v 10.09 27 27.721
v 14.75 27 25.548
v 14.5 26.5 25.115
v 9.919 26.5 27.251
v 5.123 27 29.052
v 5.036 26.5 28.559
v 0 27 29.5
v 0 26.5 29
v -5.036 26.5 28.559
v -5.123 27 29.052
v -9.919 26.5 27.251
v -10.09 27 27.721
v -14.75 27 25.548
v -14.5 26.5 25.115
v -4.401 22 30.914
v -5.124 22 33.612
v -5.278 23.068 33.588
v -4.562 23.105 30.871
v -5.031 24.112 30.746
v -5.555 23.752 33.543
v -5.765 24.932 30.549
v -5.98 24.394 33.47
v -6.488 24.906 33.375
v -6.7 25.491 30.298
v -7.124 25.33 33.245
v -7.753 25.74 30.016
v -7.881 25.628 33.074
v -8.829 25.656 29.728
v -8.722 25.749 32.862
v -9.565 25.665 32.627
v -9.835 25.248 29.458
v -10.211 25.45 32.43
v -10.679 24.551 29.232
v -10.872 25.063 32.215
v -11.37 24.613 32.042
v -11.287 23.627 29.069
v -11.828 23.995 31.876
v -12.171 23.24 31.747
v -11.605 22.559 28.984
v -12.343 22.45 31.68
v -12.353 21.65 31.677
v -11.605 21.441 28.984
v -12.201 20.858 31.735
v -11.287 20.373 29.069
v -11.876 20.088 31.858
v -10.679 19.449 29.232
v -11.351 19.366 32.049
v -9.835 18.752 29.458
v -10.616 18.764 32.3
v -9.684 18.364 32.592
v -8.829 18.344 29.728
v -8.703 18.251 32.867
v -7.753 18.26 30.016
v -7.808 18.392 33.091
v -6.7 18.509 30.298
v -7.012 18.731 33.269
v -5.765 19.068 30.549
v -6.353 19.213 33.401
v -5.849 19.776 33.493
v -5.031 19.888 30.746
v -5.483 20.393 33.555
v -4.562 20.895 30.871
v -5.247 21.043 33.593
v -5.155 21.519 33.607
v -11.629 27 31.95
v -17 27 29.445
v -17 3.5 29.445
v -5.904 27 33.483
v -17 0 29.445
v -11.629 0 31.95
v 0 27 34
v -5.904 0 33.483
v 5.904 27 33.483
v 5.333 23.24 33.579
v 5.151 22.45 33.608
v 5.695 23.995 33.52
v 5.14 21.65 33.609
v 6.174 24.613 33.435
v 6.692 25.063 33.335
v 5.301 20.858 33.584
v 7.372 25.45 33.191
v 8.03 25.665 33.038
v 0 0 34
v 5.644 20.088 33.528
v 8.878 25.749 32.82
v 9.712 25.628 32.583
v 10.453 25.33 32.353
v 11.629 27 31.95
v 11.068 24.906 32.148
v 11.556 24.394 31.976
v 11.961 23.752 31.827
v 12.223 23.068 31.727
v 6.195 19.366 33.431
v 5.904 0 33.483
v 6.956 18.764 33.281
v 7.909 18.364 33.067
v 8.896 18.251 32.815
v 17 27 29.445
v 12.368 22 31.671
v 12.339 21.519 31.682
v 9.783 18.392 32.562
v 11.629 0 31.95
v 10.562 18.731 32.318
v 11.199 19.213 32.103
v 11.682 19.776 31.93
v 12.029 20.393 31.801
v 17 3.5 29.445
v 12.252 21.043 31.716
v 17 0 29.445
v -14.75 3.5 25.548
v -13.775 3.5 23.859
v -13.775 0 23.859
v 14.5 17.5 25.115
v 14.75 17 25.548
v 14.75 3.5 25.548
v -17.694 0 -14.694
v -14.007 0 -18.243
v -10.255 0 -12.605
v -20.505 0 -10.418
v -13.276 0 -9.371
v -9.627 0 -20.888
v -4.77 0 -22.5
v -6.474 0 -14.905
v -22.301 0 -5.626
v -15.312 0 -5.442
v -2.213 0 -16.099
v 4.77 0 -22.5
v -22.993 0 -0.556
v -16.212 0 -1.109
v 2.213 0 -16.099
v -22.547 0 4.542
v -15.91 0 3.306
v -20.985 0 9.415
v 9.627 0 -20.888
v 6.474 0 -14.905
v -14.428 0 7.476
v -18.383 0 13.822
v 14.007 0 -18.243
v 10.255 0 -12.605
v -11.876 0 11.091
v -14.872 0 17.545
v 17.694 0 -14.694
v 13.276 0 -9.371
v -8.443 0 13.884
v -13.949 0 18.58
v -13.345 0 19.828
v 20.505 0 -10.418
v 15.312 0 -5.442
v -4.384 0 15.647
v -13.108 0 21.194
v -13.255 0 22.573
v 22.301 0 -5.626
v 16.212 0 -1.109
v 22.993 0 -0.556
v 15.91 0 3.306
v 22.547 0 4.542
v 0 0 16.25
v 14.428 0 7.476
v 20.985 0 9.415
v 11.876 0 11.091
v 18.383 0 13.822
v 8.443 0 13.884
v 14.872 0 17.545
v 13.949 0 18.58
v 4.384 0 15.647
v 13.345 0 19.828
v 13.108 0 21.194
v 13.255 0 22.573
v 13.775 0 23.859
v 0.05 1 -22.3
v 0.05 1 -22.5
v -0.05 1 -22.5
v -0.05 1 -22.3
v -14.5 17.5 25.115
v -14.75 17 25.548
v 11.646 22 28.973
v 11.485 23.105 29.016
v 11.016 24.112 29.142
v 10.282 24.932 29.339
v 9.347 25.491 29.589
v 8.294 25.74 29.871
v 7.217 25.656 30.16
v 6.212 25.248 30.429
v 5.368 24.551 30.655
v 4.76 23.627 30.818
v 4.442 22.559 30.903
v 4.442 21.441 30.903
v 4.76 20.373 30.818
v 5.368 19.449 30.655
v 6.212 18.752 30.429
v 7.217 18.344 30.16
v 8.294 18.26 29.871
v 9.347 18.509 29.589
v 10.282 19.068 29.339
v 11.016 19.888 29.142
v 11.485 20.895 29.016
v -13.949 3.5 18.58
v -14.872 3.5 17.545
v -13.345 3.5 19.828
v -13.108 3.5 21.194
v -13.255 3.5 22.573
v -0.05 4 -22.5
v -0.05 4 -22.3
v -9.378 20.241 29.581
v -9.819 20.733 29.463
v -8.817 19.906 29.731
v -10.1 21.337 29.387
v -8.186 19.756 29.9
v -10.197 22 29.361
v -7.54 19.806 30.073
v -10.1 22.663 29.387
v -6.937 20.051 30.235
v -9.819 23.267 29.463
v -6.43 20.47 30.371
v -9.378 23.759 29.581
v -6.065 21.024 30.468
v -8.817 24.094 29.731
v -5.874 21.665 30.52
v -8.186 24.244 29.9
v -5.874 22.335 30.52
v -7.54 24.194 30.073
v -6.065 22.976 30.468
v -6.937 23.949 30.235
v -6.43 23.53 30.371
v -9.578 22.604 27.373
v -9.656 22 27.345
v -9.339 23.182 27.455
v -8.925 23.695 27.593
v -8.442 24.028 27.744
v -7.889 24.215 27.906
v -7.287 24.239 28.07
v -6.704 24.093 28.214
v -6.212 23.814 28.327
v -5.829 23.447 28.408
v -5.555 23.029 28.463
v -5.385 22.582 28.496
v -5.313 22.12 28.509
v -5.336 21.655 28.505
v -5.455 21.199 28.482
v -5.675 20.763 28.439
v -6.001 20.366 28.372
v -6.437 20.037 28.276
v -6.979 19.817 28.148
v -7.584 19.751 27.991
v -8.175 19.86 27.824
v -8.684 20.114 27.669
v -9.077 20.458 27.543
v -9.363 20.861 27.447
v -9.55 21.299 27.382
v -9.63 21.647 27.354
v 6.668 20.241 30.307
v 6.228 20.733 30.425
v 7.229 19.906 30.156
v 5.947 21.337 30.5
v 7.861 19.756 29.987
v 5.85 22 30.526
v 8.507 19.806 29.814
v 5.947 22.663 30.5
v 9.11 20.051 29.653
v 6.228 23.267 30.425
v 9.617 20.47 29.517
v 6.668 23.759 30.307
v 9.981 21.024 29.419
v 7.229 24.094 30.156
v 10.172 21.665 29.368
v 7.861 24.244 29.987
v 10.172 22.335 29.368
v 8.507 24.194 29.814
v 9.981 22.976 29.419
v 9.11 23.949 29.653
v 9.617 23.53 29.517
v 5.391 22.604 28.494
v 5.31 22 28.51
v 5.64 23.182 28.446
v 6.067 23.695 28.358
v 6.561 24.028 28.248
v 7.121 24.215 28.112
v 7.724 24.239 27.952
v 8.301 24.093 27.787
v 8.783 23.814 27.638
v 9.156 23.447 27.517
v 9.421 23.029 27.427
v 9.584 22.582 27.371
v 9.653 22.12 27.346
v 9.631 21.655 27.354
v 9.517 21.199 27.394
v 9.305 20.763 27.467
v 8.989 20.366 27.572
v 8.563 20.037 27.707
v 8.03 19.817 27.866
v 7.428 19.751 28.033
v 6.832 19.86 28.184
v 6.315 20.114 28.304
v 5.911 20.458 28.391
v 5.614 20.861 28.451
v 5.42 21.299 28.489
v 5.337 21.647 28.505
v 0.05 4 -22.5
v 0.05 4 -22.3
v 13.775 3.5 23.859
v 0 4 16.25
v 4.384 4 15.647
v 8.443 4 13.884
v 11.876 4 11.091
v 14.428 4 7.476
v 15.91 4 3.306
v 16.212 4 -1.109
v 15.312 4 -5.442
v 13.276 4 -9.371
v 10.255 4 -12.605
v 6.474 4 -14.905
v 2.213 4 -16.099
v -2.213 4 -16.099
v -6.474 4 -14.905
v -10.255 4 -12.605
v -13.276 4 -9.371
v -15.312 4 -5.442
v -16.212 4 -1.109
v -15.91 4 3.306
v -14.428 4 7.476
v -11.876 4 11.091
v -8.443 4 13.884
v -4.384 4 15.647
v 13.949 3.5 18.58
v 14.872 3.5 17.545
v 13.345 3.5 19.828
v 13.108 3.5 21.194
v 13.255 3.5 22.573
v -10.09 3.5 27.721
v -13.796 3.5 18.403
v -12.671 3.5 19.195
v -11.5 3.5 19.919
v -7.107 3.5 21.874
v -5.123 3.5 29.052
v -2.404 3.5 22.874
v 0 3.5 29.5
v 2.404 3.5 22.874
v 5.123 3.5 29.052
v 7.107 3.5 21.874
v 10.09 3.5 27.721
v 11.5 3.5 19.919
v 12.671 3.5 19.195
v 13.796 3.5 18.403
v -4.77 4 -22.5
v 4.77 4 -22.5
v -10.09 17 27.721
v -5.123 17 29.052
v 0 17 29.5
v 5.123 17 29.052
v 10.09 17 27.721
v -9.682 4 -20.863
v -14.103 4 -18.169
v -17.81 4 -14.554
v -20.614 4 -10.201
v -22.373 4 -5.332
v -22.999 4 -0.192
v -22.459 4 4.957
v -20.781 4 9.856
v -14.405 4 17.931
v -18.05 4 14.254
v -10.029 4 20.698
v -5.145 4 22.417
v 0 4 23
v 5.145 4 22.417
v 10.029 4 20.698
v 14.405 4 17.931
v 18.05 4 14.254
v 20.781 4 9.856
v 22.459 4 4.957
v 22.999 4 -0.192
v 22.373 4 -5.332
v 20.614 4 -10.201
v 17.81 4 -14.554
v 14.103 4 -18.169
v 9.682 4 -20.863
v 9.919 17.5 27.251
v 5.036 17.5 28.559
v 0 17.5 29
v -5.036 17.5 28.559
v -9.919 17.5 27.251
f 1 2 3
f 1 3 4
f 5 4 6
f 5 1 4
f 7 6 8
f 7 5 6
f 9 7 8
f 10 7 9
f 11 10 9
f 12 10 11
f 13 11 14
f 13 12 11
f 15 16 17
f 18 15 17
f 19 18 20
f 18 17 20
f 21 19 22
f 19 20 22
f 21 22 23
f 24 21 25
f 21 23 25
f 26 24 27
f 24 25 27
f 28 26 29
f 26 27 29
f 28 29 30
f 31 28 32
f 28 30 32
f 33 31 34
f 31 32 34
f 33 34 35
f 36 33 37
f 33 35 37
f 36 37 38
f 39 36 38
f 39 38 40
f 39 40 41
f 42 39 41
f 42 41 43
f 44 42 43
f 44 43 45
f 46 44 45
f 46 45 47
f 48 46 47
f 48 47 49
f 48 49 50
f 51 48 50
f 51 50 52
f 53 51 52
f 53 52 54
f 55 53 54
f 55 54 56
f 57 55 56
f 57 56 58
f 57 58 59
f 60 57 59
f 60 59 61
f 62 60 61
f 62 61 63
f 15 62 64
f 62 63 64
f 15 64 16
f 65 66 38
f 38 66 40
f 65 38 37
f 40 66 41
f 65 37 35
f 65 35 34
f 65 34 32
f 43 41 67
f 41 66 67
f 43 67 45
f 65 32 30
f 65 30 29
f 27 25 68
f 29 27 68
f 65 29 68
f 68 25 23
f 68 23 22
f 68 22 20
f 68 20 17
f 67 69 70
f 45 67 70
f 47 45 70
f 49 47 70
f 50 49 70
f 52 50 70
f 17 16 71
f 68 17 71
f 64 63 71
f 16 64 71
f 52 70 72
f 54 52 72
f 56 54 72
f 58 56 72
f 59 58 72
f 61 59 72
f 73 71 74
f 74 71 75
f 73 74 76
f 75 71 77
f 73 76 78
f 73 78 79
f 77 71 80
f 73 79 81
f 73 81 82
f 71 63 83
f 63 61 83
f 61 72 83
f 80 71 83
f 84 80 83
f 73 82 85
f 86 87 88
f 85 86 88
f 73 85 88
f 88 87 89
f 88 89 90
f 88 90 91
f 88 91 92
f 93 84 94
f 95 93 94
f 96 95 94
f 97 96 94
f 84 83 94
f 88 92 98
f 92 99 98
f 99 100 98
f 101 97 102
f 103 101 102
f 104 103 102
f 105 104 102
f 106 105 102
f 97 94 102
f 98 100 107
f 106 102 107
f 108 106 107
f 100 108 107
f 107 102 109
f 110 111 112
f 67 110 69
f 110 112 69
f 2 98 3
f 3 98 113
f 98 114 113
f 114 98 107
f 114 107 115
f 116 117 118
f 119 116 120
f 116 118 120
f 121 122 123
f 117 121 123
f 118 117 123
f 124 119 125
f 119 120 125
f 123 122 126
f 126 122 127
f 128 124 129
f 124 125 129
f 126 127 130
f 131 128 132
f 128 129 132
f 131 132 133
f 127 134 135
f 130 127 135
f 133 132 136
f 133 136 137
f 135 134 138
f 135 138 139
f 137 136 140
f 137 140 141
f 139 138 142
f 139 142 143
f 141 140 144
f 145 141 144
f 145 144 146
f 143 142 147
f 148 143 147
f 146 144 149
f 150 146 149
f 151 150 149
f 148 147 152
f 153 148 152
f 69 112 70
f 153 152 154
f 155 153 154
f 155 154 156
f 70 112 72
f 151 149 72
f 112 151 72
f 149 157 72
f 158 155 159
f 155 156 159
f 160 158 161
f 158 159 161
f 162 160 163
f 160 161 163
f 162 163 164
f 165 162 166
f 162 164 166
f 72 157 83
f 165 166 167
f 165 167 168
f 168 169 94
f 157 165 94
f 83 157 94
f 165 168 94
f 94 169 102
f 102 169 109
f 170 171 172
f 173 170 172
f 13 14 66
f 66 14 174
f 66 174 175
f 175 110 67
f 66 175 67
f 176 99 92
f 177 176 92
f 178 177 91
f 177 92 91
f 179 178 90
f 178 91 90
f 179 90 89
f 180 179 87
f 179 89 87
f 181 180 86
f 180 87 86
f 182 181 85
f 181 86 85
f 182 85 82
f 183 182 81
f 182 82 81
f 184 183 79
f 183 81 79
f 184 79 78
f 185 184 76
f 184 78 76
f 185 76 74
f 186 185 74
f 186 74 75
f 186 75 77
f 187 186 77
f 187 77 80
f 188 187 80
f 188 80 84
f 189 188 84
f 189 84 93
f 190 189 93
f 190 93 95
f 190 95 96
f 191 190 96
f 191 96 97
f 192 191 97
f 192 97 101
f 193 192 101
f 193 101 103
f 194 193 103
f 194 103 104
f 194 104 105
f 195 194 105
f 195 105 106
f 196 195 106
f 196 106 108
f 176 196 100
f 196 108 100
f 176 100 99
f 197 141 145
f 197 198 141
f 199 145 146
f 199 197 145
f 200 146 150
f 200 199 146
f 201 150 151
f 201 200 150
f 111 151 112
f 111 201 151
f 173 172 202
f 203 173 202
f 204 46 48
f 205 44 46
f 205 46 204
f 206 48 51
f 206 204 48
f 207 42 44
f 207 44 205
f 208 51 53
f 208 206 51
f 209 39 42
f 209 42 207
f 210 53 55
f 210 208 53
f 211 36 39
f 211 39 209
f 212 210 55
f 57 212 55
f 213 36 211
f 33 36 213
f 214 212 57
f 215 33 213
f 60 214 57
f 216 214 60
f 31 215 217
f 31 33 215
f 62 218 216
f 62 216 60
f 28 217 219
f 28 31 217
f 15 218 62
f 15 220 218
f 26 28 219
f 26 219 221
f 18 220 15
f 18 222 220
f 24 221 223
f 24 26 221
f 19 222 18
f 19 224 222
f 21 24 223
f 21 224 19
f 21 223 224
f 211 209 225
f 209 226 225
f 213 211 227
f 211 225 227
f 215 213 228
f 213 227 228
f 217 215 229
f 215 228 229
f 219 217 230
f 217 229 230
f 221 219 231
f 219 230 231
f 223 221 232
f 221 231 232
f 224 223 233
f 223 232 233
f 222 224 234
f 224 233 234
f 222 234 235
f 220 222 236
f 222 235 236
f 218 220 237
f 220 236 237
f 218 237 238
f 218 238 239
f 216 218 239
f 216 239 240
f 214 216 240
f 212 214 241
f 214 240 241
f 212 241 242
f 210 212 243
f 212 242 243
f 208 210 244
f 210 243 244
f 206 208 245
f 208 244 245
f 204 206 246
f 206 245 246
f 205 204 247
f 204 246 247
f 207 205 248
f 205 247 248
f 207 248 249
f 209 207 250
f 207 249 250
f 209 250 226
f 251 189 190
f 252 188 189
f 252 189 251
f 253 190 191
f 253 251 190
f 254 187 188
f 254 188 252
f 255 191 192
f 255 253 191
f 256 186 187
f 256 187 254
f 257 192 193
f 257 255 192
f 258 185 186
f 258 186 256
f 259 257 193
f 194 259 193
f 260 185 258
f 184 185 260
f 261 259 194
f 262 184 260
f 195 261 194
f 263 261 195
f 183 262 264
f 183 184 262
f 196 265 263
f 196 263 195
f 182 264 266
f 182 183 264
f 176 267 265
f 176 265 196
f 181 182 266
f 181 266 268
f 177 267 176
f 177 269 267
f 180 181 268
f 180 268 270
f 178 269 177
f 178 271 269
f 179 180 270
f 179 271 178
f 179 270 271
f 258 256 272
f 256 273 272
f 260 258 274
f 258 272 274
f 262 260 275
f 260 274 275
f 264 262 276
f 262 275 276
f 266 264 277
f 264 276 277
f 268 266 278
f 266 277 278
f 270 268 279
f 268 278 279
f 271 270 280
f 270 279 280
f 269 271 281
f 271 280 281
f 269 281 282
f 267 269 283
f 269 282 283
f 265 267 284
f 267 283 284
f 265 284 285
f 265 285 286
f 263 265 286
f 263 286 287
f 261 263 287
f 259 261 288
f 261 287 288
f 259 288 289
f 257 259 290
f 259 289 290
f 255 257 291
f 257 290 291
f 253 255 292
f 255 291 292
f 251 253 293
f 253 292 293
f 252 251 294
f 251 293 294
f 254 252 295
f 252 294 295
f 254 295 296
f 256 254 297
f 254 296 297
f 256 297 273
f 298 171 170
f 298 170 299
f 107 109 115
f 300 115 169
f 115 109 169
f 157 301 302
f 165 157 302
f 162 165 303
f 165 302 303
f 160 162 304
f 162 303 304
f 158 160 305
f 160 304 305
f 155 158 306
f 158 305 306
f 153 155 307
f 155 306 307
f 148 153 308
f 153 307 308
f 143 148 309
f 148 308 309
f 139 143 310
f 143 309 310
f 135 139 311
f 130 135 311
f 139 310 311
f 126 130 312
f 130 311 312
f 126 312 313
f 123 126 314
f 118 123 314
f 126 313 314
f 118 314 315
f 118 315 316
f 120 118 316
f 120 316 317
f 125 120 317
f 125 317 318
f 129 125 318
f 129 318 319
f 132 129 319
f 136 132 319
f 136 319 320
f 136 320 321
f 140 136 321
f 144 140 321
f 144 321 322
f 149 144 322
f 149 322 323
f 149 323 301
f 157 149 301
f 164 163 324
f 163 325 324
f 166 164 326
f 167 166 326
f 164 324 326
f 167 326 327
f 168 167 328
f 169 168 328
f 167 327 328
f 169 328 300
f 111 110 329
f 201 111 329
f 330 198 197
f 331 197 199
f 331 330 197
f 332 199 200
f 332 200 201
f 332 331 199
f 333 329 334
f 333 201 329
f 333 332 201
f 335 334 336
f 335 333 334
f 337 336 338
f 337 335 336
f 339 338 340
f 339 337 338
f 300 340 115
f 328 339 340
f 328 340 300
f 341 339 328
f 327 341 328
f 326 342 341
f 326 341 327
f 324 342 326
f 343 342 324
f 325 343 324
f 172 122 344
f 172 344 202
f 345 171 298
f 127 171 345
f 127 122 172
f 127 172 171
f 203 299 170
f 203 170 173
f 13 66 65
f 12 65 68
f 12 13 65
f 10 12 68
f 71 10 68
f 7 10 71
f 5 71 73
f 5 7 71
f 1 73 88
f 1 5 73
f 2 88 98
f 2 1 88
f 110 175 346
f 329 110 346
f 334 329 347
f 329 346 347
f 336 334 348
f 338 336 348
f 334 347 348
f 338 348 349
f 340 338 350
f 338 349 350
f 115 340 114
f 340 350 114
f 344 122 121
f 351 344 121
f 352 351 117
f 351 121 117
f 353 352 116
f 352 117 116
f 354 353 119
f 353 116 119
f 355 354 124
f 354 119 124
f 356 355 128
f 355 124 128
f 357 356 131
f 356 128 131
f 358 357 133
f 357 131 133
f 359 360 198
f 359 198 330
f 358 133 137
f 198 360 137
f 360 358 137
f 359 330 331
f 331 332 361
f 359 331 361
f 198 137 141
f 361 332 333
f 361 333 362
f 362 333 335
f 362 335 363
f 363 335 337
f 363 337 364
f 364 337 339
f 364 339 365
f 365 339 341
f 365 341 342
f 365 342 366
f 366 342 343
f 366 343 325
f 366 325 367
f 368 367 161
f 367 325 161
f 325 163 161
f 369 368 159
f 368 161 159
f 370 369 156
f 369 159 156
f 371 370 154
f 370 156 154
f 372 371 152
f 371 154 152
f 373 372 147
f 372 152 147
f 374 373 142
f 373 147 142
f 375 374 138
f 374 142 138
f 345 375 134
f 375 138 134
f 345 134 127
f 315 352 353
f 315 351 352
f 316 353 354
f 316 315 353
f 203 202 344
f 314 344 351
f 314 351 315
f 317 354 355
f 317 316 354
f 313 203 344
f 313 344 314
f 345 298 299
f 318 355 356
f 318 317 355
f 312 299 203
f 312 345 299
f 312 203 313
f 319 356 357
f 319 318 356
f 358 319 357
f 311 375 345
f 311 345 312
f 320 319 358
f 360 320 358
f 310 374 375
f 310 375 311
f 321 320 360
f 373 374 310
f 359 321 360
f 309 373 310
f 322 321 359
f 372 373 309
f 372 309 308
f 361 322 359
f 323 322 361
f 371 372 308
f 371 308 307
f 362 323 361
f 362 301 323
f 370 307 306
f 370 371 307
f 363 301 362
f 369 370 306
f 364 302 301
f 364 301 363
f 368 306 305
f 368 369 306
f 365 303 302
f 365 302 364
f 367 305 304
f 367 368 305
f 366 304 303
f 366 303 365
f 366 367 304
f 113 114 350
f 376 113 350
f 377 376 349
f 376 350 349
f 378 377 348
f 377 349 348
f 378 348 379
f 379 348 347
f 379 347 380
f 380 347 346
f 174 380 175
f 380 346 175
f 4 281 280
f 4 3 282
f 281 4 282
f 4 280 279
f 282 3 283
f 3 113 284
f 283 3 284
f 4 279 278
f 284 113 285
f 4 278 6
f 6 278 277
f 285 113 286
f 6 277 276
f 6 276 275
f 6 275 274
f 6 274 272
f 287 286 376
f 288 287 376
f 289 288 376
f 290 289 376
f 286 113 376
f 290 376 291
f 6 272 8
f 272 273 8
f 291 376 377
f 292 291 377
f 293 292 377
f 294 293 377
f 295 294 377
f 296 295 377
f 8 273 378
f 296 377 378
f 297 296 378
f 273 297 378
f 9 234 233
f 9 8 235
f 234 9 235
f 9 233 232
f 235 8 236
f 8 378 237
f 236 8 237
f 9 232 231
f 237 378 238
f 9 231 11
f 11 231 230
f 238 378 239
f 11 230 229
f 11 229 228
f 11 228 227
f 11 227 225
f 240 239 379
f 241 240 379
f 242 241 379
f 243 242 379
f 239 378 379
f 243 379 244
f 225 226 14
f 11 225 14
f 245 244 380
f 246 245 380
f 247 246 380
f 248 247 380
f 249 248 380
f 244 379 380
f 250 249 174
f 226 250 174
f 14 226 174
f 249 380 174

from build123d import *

# Parameters (mm, degrees)
SKETCH_1_R                          = 23
EXTRUDE_1_DEPTH                     = 4
CUT_EXTRUDE_1_DEPTH                 = 33.771939216
CUT_EXTRUDE_1_DEPTH_BACK            = 33.771939216
SKETCH_4_R                          = 16.25
CUT_EXTRUDE_2_DEPTH                 = 33.771939216
EXTRUDE_2_DEPTH                     = 3.5
FILLET_1_R                          = 5
EXTRUDE_START                       = -3.5
EXTRUDE_3_DEPTH                     = 27
CUT_EXTRUDE_START                   = -10
CUT_EXTRUDE_1_2_DEPTH               = 13.5
CHAMFER_1_SIZE                      = 0.5
HOLE_WIZARD_2_D                     = 4.5
HOLE_WIZARD_2_DEPTH                 = 7.5
HOLE_WIZARD_2_CBORE_D               = 7.5
HOLE_WIZARD_2_CBORE_DEPTH           = 3
HOLE_WIZARD_2_ON_FACE_2_D           = 4.5
HOLE_WIZARD_2_ON_FACE_2_DEPTH       = 7.5
HOLE_WIZARD_2_ON_FACE_2_CBORE_D     = 7.5
HOLE_WIZARD_2_ON_FACE_2_CBORE_DEPTH = 3
SKETCH_12_W                         = 0.1
SKETCH_12_H                         = 3
CUT_EXTRUDE_2_2_DEPTH               = 0.2


with BuildPart() as part:
    # 草图1 → 凸台-拉伸1 (new body)
    with BuildSketch(Plane(origin=(0, 0, 0), x_dir=(1, 0, 0), z_dir=(0, 1, 0))):
        with Locations(Location((0, 0, 0), (0, 0, 270))):
            Circle(SKETCH_1_R)
    extrude(amount=EXTRUDE_1_DEPTH)

    # 草图3 → Cut-Extrude 1 (cut, two sides: drawn at the far end of the back side and taken through both)
    with BuildSketch(Plane(origin=(0, 4, 0), x_dir=(1, 0, 0), z_dir=(0, 1, 0)).offset(-CUT_EXTRUDE_1_DEPTH_BACK)):
        Polygon((-121.379376924, 22.5), (-4.769696007, 22.5), (4.769696007, 22.5), (121.379376924, 22.5), (121.379376924, 255.719361835), (-121.379376924, 255.719361835), align=None)
    extrude(amount=CUT_EXTRUDE_1_DEPTH + CUT_EXTRUDE_1_DEPTH_BACK, mode=Mode.SUBTRACT)

    # 草图4 → Cut-Extrude 2 (cut, through all)
    with BuildSketch(Plane(origin=(0, 4, 0), x_dir=(1, 0, 0), z_dir=(0, 1, 0))):
        with Locations(Location((0, 0, 0), (0, 0, 270))):
            Circle(SKETCH_4_R)
    extrude(amount=-CUT_EXTRUDE_2_DEPTH, mode=Mode.SUBTRACT)

    # 草图5 → 凸台-拉伸2 (add)
    with BuildSketch(Plane(origin=(0, 0, 0), x_dir=(1, 0, 0), z_dir=(0, 1, 0))):
        with BuildLine():
            ThreePointArc((11.5, -19.918584287), (0, -23), (-11.5, -19.918584287))
            Line((-11.5, -19.918584287), (-17, -29.444863729))
            ThreePointArc((-17, -29.444863729), (0, -34), (17, -29.444863729))
            Line((17, -29.444863729), (11.5, -19.918584287))
        make_face()
    extrude(amount=EXTRUDE_2_DEPTH)

    # 圆角1
    fillet_1_edges = [part.edges().sort_by_distance(p)[0] for p in [
        (11.5, 1.75, 19.918584287),
        (-11.5, 1.75, 19.918584287),
    ]]
    fillet(fillet_1_edges, radius=FILLET_1_R)

    # 草图7 → 凸台-拉伸3 (add)
    with BuildSketch(Plane(origin=(0, 3.5, 0), x_dir=(1, 0, 0), z_dir=(0, 1, 0)).offset(EXTRUDE_START)):
        with BuildLine():
            Line((-14.5, -25.11473671), (-17, -29.444863729))
            ThreePointArc((-17, -29.444863729), (0, -34), (17, -29.444863729))
            Line((17, -29.444863729), (14.5, -25.11473671))
            ThreePointArc((14.5, -25.11473671), (0, -29), (-14.5, -25.11473671))
        make_face()
    extrude(amount=EXTRUDE_3_DEPTH)

    # 草图8 → Cut-Extrude 1 2 (cut)
    with BuildSketch(Plane(origin=(0, 27, 0), x_dir=(1, 0, 0), z_dir=(0, 1, 0)).offset(CUT_EXTRUDE_START)):
        with BuildLine():
            ThreePointArc((-14.75, -25.547749412), (0, -29.5), (14.75, -25.547749412))
            Line((14.75, -25.547749412), (14.25, -24.681724008))
            ThreePointArc((14.25, -24.681724008), (0, -28.5), (-14.25, -24.681724008))
            Line((-14.25, -24.681724008), (-14.75, -25.547749412))
        make_face()
    extrude(amount=-CUT_EXTRUDE_1_2_DEPTH, mode=Mode.SUBTRACT)

    # 倒角1
    chamfer_1_edges = [part.edges().sort_by_distance(p)[0] for p in [
        (0, 17, 29),
        (0, 27, 29),
    ]]
    chamfer(chamfer_1_edges, length=CHAMFER_1_SIZE - 0.0001)  # a hair under: the kernel refuses the full size

    # 孔2
    with Locations(Plane(origin=(8.799847533, 22, 32.841478094), x_dir=(0.965925826289, 0, -0.258819045103), z_dir=(0.258819045103, 0, 0.965925826289))):
        with Locations((1e-09, 0)):
            CounterBoreHole(HOLE_WIZARD_2_D / 2, HOLE_WIZARD_2_CBORE_D / 2, HOLE_WIZARD_2_CBORE_DEPTH, depth=HOLE_WIZARD_2_DEPTH)

    # 孔2 on face 2
    with Locations(Plane(origin=(-8.799847533, 22, 32.841478094), x_dir=(0.965925849201, 0, 0.258818959594), z_dir=(-0.258818959594, 0, 0.965925849201))):
        with Locations((-1e-09, 0)):
            CounterBoreHole(HOLE_WIZARD_2_ON_FACE_2_D / 2, HOLE_WIZARD_2_ON_FACE_2_CBORE_D / 2, HOLE_WIZARD_2_ON_FACE_2_CBORE_DEPTH, depth=HOLE_WIZARD_2_ON_FACE_2_DEPTH)

    # 草图12 → Cut-Extrude 2 2 (cut)
    with BuildSketch(Plane(origin=(0, 0, -22.5), x_dir=(-1, 0, 0), z_dir=(0, 0, -1))):
        with Locations((0, 2.5)):
            Rectangle(SKETCH_12_W, SKETCH_12_H)
    extrude(amount=-CUT_EXTRUDE_2_2_DEPTH, mode=Mode.SUBTRACT)


solid = part.part
